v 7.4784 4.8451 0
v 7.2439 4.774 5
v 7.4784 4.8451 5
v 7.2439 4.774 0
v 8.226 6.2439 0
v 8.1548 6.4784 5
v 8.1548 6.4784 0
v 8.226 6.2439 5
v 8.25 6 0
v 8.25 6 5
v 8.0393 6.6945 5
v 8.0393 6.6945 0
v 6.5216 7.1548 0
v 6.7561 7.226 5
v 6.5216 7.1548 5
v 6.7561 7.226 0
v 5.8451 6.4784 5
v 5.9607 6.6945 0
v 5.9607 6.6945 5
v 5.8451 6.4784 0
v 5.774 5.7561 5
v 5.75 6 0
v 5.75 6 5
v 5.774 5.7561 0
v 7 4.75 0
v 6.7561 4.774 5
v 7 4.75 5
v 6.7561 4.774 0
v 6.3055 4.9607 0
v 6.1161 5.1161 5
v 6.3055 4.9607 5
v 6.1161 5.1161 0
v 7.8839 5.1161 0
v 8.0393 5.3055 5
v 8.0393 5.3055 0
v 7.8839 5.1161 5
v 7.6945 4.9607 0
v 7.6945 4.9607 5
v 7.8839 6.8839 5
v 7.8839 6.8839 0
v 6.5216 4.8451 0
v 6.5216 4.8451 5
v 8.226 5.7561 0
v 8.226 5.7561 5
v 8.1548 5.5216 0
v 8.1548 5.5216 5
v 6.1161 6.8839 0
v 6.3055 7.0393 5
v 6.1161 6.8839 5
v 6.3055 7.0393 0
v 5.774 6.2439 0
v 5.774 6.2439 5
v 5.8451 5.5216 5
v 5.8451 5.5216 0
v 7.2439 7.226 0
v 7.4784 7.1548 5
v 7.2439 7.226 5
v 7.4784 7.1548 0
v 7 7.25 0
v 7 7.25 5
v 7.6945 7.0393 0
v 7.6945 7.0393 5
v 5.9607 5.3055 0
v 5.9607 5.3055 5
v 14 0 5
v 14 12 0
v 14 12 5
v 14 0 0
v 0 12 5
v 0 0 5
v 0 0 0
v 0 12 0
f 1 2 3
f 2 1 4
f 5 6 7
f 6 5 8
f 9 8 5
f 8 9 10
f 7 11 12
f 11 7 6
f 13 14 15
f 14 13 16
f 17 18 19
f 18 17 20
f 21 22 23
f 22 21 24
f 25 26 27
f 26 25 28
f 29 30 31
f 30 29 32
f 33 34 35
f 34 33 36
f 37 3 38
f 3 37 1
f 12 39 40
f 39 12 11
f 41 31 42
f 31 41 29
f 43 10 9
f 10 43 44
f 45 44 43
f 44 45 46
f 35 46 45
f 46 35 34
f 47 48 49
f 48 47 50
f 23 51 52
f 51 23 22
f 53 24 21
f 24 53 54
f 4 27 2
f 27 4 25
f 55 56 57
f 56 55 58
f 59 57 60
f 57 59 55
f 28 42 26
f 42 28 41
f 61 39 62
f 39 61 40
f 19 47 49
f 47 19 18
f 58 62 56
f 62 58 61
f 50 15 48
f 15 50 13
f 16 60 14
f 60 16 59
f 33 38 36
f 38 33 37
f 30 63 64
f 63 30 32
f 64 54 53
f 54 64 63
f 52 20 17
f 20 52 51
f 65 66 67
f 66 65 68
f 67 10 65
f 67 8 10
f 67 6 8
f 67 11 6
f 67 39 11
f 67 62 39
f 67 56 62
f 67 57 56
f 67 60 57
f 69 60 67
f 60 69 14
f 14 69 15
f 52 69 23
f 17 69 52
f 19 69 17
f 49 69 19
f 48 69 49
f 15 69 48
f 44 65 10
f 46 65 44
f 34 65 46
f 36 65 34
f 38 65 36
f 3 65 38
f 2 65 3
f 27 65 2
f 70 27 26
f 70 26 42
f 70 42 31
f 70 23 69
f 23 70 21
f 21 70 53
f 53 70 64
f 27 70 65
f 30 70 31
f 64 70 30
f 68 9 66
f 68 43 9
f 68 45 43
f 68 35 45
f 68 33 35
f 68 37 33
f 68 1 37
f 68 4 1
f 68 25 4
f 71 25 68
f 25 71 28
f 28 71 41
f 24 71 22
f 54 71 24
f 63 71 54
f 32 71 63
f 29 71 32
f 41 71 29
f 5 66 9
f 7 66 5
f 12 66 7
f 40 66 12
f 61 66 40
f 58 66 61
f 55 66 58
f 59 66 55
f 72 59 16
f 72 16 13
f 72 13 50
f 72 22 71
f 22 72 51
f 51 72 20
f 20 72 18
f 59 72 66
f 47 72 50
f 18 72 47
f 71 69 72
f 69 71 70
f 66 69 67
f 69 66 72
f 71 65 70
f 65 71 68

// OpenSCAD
$fn = 32;

// ----------------------------------------------------------------------
// Micro pad: two-hole pad, 5-20 mm class
// ----------------------------------------------------------------------

// --- parameters (mm) ---
pad_l = 14;               // pad length, X
pad_w = 12;               // pad width, Y
pad_t = 5;                // pad thickness, Z
hole_d = 2.5;             // hole diameter
hole_x = 7;               // X of the first hole centre
fit_tol = 0.1;            // tolerance for press fits, mm
free_tol = 0.3;           // tolerance for clearance fits, mm

difference() {
  cube([pad_l, pad_w, pad_t]);
  for (x = [hole_x, pad_l - hole_x])
    translate([x, pad_w / 2, -1])
      cylinder(h = pad_t + 2, d = hole_d);
}
